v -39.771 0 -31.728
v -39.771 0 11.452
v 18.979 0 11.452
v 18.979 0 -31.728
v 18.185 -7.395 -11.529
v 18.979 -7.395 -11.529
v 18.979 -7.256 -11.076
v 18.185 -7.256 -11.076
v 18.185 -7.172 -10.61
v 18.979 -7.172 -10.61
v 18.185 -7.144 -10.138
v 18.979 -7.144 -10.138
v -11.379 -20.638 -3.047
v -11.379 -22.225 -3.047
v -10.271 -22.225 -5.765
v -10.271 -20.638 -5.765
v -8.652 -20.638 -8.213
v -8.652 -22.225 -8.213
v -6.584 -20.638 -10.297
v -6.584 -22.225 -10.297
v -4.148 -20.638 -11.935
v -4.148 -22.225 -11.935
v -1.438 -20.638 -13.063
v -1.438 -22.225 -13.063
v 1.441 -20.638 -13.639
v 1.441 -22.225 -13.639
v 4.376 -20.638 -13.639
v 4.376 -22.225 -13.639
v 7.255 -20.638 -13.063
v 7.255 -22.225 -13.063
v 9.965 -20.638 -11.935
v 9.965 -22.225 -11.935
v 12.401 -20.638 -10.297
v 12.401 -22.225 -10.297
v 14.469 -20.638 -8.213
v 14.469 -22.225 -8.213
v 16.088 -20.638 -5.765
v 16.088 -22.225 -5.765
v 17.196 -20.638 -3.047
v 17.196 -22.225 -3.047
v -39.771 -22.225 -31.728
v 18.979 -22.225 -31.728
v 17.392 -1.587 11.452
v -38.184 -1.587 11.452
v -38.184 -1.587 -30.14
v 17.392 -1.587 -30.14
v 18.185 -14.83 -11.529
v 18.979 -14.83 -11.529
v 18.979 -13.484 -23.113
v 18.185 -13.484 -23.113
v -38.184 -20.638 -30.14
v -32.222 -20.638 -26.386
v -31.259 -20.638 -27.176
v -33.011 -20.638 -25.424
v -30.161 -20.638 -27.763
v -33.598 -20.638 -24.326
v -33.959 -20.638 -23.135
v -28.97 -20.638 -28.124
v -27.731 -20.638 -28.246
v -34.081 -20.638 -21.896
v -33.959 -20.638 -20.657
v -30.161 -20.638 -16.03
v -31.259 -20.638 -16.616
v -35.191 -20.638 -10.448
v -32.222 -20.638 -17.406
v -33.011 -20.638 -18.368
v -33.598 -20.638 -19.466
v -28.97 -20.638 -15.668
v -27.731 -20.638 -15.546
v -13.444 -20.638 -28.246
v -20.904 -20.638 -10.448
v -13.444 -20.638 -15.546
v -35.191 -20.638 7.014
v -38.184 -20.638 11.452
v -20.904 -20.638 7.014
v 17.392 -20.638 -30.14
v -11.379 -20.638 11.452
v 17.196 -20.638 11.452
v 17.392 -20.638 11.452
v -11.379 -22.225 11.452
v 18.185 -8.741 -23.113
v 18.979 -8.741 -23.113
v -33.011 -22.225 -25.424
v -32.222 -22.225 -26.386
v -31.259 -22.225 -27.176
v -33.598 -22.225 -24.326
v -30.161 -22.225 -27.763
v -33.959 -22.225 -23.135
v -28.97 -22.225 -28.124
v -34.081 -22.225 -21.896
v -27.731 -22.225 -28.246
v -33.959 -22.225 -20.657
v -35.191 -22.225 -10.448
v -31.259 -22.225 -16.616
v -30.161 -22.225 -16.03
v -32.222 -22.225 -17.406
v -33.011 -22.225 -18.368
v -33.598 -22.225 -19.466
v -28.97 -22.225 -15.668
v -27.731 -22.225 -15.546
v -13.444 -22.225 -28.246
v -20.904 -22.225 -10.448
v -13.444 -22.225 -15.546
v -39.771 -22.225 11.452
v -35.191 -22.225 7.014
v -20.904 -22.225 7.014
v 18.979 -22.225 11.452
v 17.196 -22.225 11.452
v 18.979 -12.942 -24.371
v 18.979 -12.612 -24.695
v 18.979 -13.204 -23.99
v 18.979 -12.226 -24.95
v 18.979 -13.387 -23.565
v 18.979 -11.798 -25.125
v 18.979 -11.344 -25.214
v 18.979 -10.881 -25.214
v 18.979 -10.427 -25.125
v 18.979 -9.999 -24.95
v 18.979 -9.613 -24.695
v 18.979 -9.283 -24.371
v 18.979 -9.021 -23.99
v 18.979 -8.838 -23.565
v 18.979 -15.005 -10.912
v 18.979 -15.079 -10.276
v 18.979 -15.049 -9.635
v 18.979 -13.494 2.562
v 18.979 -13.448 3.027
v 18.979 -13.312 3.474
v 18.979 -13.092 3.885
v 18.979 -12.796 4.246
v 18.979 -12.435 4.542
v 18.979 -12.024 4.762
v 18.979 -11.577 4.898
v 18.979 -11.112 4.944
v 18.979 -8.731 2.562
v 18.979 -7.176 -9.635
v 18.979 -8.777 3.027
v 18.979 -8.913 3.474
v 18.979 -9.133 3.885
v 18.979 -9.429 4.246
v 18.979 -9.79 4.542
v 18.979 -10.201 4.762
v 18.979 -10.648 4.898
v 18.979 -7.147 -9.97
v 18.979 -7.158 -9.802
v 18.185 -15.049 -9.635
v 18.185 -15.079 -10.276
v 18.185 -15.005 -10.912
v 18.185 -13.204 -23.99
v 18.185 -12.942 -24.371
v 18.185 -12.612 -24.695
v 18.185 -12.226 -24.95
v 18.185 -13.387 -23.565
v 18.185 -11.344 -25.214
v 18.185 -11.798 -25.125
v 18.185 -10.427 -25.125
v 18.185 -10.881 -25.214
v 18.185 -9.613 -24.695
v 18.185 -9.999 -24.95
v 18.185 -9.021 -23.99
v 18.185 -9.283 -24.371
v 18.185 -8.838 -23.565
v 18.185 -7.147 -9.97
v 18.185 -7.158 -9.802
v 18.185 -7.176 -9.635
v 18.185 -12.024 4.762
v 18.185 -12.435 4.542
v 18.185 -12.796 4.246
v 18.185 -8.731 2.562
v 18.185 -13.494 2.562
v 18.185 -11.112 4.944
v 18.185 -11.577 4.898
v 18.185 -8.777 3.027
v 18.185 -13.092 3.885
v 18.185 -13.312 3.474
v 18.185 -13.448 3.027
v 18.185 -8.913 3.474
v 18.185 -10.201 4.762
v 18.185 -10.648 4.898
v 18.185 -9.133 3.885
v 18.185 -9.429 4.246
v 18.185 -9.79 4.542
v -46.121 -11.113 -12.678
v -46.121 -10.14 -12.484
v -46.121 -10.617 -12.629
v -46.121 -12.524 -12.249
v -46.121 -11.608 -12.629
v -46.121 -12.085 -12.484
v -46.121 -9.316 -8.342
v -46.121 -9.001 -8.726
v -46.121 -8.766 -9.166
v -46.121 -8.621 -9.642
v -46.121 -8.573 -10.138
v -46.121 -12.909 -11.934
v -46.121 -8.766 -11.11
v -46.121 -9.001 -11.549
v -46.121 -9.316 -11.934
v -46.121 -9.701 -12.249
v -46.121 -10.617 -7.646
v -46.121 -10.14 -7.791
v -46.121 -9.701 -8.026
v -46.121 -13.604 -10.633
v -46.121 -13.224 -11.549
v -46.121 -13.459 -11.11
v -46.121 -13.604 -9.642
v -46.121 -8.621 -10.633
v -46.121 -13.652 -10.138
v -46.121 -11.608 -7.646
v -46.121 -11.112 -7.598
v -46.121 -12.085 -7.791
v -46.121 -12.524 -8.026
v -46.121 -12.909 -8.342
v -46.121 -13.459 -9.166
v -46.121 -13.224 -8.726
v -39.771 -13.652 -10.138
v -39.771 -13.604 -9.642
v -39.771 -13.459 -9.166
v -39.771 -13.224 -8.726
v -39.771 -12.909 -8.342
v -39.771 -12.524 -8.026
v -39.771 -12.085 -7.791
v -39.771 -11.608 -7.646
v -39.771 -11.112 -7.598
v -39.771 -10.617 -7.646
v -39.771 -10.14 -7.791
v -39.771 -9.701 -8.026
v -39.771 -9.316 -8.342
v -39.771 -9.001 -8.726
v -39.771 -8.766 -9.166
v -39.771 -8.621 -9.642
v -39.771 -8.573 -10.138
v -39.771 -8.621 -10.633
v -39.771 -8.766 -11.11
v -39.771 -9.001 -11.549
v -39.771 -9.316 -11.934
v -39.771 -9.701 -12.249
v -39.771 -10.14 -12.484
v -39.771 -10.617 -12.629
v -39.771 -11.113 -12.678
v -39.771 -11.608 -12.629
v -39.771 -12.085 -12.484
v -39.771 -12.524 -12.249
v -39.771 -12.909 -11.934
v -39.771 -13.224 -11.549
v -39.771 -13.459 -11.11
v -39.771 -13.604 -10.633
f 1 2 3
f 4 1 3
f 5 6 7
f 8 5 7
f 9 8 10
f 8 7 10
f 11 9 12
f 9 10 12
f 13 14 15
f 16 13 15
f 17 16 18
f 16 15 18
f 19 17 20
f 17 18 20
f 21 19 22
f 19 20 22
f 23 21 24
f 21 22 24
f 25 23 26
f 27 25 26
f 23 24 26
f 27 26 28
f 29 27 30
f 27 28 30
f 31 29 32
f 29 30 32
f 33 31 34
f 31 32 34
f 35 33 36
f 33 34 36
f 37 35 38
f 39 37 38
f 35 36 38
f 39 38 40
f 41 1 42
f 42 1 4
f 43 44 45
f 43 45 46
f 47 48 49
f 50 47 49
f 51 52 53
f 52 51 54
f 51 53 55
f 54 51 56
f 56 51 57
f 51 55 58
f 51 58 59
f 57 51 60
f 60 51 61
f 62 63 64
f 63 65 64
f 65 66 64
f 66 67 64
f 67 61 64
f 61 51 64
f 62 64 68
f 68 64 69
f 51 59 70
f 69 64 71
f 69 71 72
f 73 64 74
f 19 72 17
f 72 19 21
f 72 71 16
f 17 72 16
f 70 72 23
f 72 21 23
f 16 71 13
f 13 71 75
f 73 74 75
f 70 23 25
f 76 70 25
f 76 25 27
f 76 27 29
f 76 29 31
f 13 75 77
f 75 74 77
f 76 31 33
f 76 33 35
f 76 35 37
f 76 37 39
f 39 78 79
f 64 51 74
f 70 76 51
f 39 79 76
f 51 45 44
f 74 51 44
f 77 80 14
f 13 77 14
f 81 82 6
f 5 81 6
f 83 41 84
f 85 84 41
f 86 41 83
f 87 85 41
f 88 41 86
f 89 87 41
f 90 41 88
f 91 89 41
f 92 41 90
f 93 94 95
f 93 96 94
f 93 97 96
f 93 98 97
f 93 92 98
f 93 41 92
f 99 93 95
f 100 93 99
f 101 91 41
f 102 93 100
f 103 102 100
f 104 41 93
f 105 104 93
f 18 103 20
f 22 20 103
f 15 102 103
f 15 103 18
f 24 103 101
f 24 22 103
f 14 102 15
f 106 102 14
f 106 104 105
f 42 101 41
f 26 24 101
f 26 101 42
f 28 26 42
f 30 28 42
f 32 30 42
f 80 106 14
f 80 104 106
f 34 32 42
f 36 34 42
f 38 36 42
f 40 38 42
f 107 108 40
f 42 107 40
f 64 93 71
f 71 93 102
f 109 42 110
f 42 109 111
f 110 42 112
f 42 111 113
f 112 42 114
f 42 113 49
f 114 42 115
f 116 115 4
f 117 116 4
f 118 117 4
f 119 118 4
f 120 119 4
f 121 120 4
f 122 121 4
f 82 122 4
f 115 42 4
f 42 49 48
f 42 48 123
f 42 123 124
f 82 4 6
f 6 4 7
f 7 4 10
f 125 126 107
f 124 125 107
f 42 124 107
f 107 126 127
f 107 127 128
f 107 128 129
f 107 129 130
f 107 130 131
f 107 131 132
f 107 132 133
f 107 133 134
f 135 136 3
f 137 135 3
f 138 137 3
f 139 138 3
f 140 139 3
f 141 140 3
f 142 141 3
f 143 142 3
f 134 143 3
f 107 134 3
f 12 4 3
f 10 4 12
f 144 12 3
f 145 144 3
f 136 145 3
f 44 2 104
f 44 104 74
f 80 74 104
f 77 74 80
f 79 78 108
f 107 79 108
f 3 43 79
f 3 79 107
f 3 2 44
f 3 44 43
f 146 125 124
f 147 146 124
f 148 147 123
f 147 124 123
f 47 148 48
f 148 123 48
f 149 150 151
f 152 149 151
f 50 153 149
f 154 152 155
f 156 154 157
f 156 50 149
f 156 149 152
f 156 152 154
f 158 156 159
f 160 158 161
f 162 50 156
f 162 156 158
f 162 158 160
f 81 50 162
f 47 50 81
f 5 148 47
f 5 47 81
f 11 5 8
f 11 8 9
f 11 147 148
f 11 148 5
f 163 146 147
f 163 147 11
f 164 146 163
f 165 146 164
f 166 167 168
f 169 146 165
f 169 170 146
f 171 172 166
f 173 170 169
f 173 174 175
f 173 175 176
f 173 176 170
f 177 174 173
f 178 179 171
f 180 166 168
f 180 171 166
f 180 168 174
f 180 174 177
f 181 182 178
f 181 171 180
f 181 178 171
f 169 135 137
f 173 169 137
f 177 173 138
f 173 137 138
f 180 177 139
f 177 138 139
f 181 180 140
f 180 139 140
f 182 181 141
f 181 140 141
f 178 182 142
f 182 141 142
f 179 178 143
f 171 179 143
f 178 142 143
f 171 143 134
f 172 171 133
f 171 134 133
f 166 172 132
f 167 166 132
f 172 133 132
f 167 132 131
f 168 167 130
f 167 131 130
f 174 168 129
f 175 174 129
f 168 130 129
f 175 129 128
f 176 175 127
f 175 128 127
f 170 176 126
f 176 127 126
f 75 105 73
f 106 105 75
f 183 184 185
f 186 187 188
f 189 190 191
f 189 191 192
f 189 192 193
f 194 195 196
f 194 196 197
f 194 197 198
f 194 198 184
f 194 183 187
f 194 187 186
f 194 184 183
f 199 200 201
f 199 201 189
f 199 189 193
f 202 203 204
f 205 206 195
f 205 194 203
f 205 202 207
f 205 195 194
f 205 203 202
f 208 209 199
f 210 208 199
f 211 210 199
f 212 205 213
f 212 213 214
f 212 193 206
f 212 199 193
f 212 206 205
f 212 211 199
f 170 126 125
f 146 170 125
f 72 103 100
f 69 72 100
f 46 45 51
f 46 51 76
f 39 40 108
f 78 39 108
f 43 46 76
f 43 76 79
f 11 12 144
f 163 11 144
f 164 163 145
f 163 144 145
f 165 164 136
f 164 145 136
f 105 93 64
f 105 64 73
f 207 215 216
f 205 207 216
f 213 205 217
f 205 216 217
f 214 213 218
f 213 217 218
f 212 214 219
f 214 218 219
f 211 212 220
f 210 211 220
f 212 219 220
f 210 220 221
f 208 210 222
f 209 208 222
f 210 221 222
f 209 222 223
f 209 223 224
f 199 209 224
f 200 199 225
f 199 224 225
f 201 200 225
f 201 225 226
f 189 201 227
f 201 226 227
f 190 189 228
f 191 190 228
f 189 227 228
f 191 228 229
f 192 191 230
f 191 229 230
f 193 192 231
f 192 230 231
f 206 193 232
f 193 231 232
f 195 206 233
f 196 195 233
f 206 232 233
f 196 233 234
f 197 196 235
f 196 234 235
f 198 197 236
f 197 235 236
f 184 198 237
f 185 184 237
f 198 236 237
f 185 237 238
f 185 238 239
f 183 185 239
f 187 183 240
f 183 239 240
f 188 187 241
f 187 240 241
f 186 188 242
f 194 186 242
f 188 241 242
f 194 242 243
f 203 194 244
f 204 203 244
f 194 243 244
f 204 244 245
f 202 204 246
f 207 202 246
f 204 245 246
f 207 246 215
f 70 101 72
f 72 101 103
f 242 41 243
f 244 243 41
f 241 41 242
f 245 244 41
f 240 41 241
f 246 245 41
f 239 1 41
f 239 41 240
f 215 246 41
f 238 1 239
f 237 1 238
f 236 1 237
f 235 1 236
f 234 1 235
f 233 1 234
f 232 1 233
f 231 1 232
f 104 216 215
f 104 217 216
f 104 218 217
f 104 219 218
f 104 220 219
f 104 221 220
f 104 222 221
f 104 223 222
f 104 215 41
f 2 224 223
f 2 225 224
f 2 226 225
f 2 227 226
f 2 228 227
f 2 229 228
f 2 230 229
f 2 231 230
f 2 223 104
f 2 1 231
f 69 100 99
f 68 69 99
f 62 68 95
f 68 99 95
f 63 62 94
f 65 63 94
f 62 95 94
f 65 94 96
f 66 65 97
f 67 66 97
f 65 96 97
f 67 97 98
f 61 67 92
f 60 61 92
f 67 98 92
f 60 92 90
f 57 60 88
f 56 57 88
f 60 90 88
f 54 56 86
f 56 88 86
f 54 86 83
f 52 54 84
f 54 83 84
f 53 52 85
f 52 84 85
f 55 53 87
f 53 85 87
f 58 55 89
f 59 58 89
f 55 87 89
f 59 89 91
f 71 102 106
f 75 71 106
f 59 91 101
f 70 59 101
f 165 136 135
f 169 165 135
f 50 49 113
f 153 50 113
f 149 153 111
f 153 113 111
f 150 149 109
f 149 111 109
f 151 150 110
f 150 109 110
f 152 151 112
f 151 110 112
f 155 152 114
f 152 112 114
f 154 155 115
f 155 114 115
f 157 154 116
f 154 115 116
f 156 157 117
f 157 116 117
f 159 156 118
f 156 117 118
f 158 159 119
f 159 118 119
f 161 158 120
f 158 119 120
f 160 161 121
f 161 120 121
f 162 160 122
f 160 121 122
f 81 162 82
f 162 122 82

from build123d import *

# Parameters (mm, degrees)
F0_W     = 58.7502
F0_H     = 43.18
F1_DEPTH = 22.225
F2_T     = -1.5875
F3_W     = 14.2875
F3_H     = 17.4625
F4_DEPTH = 3.175
F6_DEPTH = 0.79375
F7_R     = 2.54
F8_DEPTH = 6.35


with BuildPart() as f1:
    # F0 (on Front) → F1 (new body)
    with BuildSketch(Plane.XZ):
        with Locations((-10.3959683329, -10.1375534884)):
            Rectangle(F0_W, F0_H)
    extrude(amount=F1_DEPTH)

    # F2
    f2_openings = [f1.faces().sort_by_distance(p)[0] for p in [
        (-10.395968, -11.1125, 11.452447),
    ]]
    offset(amount=F2_T, openings=f2_openings)

    # F3 (on face) → F4 (cut)
    with BuildSketch(Plane.XZ.offset(22.225)):
        with BuildLine():
            Line((17.1960732201, 11.4524465116), (-11.3789267799, 11.4524465116))
            Line((-11.3789267799, 11.4524465116), (-11.3789267799, -3.0465692528))
            ThreePointArc((-11.3789267799, -3.0465692528), (2.9085732201, -13.7111715641), (17.1960732201, -3.0465692528))
            Line((17.1960732201, -3.0465692528), (17.1960732201, 11.4524465116))
        make_face()
        with Locations((-28.0476767799, -1.7169438296)):
            Rectangle(F3_W, F3_H)
        with BuildLine():
            Line((-13.4438804602, -15.5461690363), (-27.7313804602, -15.5461690363))
            ThreePointArc((-27.7313804602, -15.5461690363), (-34.0813804602, -21.8961690363), (-27.7313804602, -28.2461690363))
            Line((-27.7313804602, -28.2461690363), (-13.4438804602, -28.2461690363))
            Line((-13.4438804602, -28.2461690363), (-13.4438804602, -15.5461690363))
        make_face()
    extrude(amount=-F4_DEPTH, mode=Mode.SUBTRACT)

    # F5 (on face) → F6 (cut)
    with BuildSketch(Plane.YZ.offset(18.9791316671)):
        with BuildLine():
            ThreePointArc((-7.3954814436, -11.5285062603), (-7.2071898997, -10.8443275565), (-7.14375, -10.1375534884))
            ThreePointArc((-7.14375, -10.1375534884), (-7.1517294651, -9.8860115785), (-7.1756357738, -9.6354811558))
            Line((-7.1756357738, -9.6354811558), (-7.3954814436, -11.5285062603))
        make_face()
        with BuildLine():
            Line((-7.3954814436, -11.5285062603), (-7.1756357738, -9.6354811558))
            ThreePointArc((-7.1756357738, -9.6354811558), (-11.1125, -6.1688034884), (-15.0493642262, -9.6354811558))
            Line((-15.0493642262, -9.6354811558), (-14.8295185564, -11.5285062603))
            ThreePointArc((-14.8295185564, -11.5285062603), (-11.1125, -14.1063034884), (-7.3954814436, -11.5285062603))
        make_face()
        with BuildLine():
            ThreePointArc((-15.0493642262, -9.6354811558), (-11.1125, -6.1688034884), (-7.1756357738, -9.6354811558))
            Line((-7.1756357738, -9.6354811558), (-8.73125, 2.5624465116))
            ThreePointArc((-8.73125, 2.5624465116), (-11.1125, 0.1811965116), (-13.49375, 2.5624465116))
            Line((-13.49375, 2.5624465116), (-15.0493642262, -9.6354811558))
        make_face()
        with BuildLine():
            Line((-8.7408400071, -23.1129852184), (-7.3954814436, -11.5285062603))
            ThreePointArc((-7.3954814436, -11.5285062603), (-11.1125, -14.1063034884), (-14.8295185564, -11.5285062603))
            Line((-14.8295185564, -11.5285062603), (-13.4841599929, -23.1129852184))
            ThreePointArc((-13.4841599929, -23.1129852184), (-11.2504462955, -20.4539418213), (-8.7249, -22.8375534884))
            ThreePointArc((-8.7249, -22.8375534884), (-8.7288883329, -22.9754997838), (-8.7408400071, -23.1129852184))
        make_face()
        with BuildLine():
            Line((-14.8295185564, -11.5285062603), (-15.0493642262, -9.6354811558))
            ThreePointArc((-15.0493642262, -9.6354811558), (-15.0547539776, -10.5953854865), (-14.8295185564, -11.5285062603))
        make_face()
        with BuildLine():
            ThreePointArc((-13.49375, 2.5624465116), (-11.1125, 0.1811965116), (-8.73125, 2.5624465116))
            ThreePointArc((-8.73125, 2.5624465116), (-11.1125, 4.9436965116), (-13.49375, 2.5624465116))
        make_face()
        with BuildLine():
            ThreePointArc((-13.4841599929, -23.1129852184), (-11.1125, -25.2251534884), (-8.7408400071, -23.1129852184))
            ThreePointArc((-8.7408400071, -23.1129852184), (-8.7288883329, -22.9754997838), (-8.7249, -22.8375534884))
            ThreePointArc((-8.7249, -22.8375534884), (-11.2504462955, -20.4539418213), (-13.4841599929, -23.1129852184))
        make_face()
    extrude(amount=-F6_DEPTH, mode=Mode.SUBTRACT)

    # F7 (on face) → F8 (join)
    with BuildSketch(Plane(origin=(-39.7710683329, 0, 0), x_dir=(0, -1, 0), z_dir=(-1, 0, 0))):
        with Locations((11.1125, -10.1375534884)):
            Circle(F7_R)
    extrude(amount=F8_DEPTH)


solid = f1.part
